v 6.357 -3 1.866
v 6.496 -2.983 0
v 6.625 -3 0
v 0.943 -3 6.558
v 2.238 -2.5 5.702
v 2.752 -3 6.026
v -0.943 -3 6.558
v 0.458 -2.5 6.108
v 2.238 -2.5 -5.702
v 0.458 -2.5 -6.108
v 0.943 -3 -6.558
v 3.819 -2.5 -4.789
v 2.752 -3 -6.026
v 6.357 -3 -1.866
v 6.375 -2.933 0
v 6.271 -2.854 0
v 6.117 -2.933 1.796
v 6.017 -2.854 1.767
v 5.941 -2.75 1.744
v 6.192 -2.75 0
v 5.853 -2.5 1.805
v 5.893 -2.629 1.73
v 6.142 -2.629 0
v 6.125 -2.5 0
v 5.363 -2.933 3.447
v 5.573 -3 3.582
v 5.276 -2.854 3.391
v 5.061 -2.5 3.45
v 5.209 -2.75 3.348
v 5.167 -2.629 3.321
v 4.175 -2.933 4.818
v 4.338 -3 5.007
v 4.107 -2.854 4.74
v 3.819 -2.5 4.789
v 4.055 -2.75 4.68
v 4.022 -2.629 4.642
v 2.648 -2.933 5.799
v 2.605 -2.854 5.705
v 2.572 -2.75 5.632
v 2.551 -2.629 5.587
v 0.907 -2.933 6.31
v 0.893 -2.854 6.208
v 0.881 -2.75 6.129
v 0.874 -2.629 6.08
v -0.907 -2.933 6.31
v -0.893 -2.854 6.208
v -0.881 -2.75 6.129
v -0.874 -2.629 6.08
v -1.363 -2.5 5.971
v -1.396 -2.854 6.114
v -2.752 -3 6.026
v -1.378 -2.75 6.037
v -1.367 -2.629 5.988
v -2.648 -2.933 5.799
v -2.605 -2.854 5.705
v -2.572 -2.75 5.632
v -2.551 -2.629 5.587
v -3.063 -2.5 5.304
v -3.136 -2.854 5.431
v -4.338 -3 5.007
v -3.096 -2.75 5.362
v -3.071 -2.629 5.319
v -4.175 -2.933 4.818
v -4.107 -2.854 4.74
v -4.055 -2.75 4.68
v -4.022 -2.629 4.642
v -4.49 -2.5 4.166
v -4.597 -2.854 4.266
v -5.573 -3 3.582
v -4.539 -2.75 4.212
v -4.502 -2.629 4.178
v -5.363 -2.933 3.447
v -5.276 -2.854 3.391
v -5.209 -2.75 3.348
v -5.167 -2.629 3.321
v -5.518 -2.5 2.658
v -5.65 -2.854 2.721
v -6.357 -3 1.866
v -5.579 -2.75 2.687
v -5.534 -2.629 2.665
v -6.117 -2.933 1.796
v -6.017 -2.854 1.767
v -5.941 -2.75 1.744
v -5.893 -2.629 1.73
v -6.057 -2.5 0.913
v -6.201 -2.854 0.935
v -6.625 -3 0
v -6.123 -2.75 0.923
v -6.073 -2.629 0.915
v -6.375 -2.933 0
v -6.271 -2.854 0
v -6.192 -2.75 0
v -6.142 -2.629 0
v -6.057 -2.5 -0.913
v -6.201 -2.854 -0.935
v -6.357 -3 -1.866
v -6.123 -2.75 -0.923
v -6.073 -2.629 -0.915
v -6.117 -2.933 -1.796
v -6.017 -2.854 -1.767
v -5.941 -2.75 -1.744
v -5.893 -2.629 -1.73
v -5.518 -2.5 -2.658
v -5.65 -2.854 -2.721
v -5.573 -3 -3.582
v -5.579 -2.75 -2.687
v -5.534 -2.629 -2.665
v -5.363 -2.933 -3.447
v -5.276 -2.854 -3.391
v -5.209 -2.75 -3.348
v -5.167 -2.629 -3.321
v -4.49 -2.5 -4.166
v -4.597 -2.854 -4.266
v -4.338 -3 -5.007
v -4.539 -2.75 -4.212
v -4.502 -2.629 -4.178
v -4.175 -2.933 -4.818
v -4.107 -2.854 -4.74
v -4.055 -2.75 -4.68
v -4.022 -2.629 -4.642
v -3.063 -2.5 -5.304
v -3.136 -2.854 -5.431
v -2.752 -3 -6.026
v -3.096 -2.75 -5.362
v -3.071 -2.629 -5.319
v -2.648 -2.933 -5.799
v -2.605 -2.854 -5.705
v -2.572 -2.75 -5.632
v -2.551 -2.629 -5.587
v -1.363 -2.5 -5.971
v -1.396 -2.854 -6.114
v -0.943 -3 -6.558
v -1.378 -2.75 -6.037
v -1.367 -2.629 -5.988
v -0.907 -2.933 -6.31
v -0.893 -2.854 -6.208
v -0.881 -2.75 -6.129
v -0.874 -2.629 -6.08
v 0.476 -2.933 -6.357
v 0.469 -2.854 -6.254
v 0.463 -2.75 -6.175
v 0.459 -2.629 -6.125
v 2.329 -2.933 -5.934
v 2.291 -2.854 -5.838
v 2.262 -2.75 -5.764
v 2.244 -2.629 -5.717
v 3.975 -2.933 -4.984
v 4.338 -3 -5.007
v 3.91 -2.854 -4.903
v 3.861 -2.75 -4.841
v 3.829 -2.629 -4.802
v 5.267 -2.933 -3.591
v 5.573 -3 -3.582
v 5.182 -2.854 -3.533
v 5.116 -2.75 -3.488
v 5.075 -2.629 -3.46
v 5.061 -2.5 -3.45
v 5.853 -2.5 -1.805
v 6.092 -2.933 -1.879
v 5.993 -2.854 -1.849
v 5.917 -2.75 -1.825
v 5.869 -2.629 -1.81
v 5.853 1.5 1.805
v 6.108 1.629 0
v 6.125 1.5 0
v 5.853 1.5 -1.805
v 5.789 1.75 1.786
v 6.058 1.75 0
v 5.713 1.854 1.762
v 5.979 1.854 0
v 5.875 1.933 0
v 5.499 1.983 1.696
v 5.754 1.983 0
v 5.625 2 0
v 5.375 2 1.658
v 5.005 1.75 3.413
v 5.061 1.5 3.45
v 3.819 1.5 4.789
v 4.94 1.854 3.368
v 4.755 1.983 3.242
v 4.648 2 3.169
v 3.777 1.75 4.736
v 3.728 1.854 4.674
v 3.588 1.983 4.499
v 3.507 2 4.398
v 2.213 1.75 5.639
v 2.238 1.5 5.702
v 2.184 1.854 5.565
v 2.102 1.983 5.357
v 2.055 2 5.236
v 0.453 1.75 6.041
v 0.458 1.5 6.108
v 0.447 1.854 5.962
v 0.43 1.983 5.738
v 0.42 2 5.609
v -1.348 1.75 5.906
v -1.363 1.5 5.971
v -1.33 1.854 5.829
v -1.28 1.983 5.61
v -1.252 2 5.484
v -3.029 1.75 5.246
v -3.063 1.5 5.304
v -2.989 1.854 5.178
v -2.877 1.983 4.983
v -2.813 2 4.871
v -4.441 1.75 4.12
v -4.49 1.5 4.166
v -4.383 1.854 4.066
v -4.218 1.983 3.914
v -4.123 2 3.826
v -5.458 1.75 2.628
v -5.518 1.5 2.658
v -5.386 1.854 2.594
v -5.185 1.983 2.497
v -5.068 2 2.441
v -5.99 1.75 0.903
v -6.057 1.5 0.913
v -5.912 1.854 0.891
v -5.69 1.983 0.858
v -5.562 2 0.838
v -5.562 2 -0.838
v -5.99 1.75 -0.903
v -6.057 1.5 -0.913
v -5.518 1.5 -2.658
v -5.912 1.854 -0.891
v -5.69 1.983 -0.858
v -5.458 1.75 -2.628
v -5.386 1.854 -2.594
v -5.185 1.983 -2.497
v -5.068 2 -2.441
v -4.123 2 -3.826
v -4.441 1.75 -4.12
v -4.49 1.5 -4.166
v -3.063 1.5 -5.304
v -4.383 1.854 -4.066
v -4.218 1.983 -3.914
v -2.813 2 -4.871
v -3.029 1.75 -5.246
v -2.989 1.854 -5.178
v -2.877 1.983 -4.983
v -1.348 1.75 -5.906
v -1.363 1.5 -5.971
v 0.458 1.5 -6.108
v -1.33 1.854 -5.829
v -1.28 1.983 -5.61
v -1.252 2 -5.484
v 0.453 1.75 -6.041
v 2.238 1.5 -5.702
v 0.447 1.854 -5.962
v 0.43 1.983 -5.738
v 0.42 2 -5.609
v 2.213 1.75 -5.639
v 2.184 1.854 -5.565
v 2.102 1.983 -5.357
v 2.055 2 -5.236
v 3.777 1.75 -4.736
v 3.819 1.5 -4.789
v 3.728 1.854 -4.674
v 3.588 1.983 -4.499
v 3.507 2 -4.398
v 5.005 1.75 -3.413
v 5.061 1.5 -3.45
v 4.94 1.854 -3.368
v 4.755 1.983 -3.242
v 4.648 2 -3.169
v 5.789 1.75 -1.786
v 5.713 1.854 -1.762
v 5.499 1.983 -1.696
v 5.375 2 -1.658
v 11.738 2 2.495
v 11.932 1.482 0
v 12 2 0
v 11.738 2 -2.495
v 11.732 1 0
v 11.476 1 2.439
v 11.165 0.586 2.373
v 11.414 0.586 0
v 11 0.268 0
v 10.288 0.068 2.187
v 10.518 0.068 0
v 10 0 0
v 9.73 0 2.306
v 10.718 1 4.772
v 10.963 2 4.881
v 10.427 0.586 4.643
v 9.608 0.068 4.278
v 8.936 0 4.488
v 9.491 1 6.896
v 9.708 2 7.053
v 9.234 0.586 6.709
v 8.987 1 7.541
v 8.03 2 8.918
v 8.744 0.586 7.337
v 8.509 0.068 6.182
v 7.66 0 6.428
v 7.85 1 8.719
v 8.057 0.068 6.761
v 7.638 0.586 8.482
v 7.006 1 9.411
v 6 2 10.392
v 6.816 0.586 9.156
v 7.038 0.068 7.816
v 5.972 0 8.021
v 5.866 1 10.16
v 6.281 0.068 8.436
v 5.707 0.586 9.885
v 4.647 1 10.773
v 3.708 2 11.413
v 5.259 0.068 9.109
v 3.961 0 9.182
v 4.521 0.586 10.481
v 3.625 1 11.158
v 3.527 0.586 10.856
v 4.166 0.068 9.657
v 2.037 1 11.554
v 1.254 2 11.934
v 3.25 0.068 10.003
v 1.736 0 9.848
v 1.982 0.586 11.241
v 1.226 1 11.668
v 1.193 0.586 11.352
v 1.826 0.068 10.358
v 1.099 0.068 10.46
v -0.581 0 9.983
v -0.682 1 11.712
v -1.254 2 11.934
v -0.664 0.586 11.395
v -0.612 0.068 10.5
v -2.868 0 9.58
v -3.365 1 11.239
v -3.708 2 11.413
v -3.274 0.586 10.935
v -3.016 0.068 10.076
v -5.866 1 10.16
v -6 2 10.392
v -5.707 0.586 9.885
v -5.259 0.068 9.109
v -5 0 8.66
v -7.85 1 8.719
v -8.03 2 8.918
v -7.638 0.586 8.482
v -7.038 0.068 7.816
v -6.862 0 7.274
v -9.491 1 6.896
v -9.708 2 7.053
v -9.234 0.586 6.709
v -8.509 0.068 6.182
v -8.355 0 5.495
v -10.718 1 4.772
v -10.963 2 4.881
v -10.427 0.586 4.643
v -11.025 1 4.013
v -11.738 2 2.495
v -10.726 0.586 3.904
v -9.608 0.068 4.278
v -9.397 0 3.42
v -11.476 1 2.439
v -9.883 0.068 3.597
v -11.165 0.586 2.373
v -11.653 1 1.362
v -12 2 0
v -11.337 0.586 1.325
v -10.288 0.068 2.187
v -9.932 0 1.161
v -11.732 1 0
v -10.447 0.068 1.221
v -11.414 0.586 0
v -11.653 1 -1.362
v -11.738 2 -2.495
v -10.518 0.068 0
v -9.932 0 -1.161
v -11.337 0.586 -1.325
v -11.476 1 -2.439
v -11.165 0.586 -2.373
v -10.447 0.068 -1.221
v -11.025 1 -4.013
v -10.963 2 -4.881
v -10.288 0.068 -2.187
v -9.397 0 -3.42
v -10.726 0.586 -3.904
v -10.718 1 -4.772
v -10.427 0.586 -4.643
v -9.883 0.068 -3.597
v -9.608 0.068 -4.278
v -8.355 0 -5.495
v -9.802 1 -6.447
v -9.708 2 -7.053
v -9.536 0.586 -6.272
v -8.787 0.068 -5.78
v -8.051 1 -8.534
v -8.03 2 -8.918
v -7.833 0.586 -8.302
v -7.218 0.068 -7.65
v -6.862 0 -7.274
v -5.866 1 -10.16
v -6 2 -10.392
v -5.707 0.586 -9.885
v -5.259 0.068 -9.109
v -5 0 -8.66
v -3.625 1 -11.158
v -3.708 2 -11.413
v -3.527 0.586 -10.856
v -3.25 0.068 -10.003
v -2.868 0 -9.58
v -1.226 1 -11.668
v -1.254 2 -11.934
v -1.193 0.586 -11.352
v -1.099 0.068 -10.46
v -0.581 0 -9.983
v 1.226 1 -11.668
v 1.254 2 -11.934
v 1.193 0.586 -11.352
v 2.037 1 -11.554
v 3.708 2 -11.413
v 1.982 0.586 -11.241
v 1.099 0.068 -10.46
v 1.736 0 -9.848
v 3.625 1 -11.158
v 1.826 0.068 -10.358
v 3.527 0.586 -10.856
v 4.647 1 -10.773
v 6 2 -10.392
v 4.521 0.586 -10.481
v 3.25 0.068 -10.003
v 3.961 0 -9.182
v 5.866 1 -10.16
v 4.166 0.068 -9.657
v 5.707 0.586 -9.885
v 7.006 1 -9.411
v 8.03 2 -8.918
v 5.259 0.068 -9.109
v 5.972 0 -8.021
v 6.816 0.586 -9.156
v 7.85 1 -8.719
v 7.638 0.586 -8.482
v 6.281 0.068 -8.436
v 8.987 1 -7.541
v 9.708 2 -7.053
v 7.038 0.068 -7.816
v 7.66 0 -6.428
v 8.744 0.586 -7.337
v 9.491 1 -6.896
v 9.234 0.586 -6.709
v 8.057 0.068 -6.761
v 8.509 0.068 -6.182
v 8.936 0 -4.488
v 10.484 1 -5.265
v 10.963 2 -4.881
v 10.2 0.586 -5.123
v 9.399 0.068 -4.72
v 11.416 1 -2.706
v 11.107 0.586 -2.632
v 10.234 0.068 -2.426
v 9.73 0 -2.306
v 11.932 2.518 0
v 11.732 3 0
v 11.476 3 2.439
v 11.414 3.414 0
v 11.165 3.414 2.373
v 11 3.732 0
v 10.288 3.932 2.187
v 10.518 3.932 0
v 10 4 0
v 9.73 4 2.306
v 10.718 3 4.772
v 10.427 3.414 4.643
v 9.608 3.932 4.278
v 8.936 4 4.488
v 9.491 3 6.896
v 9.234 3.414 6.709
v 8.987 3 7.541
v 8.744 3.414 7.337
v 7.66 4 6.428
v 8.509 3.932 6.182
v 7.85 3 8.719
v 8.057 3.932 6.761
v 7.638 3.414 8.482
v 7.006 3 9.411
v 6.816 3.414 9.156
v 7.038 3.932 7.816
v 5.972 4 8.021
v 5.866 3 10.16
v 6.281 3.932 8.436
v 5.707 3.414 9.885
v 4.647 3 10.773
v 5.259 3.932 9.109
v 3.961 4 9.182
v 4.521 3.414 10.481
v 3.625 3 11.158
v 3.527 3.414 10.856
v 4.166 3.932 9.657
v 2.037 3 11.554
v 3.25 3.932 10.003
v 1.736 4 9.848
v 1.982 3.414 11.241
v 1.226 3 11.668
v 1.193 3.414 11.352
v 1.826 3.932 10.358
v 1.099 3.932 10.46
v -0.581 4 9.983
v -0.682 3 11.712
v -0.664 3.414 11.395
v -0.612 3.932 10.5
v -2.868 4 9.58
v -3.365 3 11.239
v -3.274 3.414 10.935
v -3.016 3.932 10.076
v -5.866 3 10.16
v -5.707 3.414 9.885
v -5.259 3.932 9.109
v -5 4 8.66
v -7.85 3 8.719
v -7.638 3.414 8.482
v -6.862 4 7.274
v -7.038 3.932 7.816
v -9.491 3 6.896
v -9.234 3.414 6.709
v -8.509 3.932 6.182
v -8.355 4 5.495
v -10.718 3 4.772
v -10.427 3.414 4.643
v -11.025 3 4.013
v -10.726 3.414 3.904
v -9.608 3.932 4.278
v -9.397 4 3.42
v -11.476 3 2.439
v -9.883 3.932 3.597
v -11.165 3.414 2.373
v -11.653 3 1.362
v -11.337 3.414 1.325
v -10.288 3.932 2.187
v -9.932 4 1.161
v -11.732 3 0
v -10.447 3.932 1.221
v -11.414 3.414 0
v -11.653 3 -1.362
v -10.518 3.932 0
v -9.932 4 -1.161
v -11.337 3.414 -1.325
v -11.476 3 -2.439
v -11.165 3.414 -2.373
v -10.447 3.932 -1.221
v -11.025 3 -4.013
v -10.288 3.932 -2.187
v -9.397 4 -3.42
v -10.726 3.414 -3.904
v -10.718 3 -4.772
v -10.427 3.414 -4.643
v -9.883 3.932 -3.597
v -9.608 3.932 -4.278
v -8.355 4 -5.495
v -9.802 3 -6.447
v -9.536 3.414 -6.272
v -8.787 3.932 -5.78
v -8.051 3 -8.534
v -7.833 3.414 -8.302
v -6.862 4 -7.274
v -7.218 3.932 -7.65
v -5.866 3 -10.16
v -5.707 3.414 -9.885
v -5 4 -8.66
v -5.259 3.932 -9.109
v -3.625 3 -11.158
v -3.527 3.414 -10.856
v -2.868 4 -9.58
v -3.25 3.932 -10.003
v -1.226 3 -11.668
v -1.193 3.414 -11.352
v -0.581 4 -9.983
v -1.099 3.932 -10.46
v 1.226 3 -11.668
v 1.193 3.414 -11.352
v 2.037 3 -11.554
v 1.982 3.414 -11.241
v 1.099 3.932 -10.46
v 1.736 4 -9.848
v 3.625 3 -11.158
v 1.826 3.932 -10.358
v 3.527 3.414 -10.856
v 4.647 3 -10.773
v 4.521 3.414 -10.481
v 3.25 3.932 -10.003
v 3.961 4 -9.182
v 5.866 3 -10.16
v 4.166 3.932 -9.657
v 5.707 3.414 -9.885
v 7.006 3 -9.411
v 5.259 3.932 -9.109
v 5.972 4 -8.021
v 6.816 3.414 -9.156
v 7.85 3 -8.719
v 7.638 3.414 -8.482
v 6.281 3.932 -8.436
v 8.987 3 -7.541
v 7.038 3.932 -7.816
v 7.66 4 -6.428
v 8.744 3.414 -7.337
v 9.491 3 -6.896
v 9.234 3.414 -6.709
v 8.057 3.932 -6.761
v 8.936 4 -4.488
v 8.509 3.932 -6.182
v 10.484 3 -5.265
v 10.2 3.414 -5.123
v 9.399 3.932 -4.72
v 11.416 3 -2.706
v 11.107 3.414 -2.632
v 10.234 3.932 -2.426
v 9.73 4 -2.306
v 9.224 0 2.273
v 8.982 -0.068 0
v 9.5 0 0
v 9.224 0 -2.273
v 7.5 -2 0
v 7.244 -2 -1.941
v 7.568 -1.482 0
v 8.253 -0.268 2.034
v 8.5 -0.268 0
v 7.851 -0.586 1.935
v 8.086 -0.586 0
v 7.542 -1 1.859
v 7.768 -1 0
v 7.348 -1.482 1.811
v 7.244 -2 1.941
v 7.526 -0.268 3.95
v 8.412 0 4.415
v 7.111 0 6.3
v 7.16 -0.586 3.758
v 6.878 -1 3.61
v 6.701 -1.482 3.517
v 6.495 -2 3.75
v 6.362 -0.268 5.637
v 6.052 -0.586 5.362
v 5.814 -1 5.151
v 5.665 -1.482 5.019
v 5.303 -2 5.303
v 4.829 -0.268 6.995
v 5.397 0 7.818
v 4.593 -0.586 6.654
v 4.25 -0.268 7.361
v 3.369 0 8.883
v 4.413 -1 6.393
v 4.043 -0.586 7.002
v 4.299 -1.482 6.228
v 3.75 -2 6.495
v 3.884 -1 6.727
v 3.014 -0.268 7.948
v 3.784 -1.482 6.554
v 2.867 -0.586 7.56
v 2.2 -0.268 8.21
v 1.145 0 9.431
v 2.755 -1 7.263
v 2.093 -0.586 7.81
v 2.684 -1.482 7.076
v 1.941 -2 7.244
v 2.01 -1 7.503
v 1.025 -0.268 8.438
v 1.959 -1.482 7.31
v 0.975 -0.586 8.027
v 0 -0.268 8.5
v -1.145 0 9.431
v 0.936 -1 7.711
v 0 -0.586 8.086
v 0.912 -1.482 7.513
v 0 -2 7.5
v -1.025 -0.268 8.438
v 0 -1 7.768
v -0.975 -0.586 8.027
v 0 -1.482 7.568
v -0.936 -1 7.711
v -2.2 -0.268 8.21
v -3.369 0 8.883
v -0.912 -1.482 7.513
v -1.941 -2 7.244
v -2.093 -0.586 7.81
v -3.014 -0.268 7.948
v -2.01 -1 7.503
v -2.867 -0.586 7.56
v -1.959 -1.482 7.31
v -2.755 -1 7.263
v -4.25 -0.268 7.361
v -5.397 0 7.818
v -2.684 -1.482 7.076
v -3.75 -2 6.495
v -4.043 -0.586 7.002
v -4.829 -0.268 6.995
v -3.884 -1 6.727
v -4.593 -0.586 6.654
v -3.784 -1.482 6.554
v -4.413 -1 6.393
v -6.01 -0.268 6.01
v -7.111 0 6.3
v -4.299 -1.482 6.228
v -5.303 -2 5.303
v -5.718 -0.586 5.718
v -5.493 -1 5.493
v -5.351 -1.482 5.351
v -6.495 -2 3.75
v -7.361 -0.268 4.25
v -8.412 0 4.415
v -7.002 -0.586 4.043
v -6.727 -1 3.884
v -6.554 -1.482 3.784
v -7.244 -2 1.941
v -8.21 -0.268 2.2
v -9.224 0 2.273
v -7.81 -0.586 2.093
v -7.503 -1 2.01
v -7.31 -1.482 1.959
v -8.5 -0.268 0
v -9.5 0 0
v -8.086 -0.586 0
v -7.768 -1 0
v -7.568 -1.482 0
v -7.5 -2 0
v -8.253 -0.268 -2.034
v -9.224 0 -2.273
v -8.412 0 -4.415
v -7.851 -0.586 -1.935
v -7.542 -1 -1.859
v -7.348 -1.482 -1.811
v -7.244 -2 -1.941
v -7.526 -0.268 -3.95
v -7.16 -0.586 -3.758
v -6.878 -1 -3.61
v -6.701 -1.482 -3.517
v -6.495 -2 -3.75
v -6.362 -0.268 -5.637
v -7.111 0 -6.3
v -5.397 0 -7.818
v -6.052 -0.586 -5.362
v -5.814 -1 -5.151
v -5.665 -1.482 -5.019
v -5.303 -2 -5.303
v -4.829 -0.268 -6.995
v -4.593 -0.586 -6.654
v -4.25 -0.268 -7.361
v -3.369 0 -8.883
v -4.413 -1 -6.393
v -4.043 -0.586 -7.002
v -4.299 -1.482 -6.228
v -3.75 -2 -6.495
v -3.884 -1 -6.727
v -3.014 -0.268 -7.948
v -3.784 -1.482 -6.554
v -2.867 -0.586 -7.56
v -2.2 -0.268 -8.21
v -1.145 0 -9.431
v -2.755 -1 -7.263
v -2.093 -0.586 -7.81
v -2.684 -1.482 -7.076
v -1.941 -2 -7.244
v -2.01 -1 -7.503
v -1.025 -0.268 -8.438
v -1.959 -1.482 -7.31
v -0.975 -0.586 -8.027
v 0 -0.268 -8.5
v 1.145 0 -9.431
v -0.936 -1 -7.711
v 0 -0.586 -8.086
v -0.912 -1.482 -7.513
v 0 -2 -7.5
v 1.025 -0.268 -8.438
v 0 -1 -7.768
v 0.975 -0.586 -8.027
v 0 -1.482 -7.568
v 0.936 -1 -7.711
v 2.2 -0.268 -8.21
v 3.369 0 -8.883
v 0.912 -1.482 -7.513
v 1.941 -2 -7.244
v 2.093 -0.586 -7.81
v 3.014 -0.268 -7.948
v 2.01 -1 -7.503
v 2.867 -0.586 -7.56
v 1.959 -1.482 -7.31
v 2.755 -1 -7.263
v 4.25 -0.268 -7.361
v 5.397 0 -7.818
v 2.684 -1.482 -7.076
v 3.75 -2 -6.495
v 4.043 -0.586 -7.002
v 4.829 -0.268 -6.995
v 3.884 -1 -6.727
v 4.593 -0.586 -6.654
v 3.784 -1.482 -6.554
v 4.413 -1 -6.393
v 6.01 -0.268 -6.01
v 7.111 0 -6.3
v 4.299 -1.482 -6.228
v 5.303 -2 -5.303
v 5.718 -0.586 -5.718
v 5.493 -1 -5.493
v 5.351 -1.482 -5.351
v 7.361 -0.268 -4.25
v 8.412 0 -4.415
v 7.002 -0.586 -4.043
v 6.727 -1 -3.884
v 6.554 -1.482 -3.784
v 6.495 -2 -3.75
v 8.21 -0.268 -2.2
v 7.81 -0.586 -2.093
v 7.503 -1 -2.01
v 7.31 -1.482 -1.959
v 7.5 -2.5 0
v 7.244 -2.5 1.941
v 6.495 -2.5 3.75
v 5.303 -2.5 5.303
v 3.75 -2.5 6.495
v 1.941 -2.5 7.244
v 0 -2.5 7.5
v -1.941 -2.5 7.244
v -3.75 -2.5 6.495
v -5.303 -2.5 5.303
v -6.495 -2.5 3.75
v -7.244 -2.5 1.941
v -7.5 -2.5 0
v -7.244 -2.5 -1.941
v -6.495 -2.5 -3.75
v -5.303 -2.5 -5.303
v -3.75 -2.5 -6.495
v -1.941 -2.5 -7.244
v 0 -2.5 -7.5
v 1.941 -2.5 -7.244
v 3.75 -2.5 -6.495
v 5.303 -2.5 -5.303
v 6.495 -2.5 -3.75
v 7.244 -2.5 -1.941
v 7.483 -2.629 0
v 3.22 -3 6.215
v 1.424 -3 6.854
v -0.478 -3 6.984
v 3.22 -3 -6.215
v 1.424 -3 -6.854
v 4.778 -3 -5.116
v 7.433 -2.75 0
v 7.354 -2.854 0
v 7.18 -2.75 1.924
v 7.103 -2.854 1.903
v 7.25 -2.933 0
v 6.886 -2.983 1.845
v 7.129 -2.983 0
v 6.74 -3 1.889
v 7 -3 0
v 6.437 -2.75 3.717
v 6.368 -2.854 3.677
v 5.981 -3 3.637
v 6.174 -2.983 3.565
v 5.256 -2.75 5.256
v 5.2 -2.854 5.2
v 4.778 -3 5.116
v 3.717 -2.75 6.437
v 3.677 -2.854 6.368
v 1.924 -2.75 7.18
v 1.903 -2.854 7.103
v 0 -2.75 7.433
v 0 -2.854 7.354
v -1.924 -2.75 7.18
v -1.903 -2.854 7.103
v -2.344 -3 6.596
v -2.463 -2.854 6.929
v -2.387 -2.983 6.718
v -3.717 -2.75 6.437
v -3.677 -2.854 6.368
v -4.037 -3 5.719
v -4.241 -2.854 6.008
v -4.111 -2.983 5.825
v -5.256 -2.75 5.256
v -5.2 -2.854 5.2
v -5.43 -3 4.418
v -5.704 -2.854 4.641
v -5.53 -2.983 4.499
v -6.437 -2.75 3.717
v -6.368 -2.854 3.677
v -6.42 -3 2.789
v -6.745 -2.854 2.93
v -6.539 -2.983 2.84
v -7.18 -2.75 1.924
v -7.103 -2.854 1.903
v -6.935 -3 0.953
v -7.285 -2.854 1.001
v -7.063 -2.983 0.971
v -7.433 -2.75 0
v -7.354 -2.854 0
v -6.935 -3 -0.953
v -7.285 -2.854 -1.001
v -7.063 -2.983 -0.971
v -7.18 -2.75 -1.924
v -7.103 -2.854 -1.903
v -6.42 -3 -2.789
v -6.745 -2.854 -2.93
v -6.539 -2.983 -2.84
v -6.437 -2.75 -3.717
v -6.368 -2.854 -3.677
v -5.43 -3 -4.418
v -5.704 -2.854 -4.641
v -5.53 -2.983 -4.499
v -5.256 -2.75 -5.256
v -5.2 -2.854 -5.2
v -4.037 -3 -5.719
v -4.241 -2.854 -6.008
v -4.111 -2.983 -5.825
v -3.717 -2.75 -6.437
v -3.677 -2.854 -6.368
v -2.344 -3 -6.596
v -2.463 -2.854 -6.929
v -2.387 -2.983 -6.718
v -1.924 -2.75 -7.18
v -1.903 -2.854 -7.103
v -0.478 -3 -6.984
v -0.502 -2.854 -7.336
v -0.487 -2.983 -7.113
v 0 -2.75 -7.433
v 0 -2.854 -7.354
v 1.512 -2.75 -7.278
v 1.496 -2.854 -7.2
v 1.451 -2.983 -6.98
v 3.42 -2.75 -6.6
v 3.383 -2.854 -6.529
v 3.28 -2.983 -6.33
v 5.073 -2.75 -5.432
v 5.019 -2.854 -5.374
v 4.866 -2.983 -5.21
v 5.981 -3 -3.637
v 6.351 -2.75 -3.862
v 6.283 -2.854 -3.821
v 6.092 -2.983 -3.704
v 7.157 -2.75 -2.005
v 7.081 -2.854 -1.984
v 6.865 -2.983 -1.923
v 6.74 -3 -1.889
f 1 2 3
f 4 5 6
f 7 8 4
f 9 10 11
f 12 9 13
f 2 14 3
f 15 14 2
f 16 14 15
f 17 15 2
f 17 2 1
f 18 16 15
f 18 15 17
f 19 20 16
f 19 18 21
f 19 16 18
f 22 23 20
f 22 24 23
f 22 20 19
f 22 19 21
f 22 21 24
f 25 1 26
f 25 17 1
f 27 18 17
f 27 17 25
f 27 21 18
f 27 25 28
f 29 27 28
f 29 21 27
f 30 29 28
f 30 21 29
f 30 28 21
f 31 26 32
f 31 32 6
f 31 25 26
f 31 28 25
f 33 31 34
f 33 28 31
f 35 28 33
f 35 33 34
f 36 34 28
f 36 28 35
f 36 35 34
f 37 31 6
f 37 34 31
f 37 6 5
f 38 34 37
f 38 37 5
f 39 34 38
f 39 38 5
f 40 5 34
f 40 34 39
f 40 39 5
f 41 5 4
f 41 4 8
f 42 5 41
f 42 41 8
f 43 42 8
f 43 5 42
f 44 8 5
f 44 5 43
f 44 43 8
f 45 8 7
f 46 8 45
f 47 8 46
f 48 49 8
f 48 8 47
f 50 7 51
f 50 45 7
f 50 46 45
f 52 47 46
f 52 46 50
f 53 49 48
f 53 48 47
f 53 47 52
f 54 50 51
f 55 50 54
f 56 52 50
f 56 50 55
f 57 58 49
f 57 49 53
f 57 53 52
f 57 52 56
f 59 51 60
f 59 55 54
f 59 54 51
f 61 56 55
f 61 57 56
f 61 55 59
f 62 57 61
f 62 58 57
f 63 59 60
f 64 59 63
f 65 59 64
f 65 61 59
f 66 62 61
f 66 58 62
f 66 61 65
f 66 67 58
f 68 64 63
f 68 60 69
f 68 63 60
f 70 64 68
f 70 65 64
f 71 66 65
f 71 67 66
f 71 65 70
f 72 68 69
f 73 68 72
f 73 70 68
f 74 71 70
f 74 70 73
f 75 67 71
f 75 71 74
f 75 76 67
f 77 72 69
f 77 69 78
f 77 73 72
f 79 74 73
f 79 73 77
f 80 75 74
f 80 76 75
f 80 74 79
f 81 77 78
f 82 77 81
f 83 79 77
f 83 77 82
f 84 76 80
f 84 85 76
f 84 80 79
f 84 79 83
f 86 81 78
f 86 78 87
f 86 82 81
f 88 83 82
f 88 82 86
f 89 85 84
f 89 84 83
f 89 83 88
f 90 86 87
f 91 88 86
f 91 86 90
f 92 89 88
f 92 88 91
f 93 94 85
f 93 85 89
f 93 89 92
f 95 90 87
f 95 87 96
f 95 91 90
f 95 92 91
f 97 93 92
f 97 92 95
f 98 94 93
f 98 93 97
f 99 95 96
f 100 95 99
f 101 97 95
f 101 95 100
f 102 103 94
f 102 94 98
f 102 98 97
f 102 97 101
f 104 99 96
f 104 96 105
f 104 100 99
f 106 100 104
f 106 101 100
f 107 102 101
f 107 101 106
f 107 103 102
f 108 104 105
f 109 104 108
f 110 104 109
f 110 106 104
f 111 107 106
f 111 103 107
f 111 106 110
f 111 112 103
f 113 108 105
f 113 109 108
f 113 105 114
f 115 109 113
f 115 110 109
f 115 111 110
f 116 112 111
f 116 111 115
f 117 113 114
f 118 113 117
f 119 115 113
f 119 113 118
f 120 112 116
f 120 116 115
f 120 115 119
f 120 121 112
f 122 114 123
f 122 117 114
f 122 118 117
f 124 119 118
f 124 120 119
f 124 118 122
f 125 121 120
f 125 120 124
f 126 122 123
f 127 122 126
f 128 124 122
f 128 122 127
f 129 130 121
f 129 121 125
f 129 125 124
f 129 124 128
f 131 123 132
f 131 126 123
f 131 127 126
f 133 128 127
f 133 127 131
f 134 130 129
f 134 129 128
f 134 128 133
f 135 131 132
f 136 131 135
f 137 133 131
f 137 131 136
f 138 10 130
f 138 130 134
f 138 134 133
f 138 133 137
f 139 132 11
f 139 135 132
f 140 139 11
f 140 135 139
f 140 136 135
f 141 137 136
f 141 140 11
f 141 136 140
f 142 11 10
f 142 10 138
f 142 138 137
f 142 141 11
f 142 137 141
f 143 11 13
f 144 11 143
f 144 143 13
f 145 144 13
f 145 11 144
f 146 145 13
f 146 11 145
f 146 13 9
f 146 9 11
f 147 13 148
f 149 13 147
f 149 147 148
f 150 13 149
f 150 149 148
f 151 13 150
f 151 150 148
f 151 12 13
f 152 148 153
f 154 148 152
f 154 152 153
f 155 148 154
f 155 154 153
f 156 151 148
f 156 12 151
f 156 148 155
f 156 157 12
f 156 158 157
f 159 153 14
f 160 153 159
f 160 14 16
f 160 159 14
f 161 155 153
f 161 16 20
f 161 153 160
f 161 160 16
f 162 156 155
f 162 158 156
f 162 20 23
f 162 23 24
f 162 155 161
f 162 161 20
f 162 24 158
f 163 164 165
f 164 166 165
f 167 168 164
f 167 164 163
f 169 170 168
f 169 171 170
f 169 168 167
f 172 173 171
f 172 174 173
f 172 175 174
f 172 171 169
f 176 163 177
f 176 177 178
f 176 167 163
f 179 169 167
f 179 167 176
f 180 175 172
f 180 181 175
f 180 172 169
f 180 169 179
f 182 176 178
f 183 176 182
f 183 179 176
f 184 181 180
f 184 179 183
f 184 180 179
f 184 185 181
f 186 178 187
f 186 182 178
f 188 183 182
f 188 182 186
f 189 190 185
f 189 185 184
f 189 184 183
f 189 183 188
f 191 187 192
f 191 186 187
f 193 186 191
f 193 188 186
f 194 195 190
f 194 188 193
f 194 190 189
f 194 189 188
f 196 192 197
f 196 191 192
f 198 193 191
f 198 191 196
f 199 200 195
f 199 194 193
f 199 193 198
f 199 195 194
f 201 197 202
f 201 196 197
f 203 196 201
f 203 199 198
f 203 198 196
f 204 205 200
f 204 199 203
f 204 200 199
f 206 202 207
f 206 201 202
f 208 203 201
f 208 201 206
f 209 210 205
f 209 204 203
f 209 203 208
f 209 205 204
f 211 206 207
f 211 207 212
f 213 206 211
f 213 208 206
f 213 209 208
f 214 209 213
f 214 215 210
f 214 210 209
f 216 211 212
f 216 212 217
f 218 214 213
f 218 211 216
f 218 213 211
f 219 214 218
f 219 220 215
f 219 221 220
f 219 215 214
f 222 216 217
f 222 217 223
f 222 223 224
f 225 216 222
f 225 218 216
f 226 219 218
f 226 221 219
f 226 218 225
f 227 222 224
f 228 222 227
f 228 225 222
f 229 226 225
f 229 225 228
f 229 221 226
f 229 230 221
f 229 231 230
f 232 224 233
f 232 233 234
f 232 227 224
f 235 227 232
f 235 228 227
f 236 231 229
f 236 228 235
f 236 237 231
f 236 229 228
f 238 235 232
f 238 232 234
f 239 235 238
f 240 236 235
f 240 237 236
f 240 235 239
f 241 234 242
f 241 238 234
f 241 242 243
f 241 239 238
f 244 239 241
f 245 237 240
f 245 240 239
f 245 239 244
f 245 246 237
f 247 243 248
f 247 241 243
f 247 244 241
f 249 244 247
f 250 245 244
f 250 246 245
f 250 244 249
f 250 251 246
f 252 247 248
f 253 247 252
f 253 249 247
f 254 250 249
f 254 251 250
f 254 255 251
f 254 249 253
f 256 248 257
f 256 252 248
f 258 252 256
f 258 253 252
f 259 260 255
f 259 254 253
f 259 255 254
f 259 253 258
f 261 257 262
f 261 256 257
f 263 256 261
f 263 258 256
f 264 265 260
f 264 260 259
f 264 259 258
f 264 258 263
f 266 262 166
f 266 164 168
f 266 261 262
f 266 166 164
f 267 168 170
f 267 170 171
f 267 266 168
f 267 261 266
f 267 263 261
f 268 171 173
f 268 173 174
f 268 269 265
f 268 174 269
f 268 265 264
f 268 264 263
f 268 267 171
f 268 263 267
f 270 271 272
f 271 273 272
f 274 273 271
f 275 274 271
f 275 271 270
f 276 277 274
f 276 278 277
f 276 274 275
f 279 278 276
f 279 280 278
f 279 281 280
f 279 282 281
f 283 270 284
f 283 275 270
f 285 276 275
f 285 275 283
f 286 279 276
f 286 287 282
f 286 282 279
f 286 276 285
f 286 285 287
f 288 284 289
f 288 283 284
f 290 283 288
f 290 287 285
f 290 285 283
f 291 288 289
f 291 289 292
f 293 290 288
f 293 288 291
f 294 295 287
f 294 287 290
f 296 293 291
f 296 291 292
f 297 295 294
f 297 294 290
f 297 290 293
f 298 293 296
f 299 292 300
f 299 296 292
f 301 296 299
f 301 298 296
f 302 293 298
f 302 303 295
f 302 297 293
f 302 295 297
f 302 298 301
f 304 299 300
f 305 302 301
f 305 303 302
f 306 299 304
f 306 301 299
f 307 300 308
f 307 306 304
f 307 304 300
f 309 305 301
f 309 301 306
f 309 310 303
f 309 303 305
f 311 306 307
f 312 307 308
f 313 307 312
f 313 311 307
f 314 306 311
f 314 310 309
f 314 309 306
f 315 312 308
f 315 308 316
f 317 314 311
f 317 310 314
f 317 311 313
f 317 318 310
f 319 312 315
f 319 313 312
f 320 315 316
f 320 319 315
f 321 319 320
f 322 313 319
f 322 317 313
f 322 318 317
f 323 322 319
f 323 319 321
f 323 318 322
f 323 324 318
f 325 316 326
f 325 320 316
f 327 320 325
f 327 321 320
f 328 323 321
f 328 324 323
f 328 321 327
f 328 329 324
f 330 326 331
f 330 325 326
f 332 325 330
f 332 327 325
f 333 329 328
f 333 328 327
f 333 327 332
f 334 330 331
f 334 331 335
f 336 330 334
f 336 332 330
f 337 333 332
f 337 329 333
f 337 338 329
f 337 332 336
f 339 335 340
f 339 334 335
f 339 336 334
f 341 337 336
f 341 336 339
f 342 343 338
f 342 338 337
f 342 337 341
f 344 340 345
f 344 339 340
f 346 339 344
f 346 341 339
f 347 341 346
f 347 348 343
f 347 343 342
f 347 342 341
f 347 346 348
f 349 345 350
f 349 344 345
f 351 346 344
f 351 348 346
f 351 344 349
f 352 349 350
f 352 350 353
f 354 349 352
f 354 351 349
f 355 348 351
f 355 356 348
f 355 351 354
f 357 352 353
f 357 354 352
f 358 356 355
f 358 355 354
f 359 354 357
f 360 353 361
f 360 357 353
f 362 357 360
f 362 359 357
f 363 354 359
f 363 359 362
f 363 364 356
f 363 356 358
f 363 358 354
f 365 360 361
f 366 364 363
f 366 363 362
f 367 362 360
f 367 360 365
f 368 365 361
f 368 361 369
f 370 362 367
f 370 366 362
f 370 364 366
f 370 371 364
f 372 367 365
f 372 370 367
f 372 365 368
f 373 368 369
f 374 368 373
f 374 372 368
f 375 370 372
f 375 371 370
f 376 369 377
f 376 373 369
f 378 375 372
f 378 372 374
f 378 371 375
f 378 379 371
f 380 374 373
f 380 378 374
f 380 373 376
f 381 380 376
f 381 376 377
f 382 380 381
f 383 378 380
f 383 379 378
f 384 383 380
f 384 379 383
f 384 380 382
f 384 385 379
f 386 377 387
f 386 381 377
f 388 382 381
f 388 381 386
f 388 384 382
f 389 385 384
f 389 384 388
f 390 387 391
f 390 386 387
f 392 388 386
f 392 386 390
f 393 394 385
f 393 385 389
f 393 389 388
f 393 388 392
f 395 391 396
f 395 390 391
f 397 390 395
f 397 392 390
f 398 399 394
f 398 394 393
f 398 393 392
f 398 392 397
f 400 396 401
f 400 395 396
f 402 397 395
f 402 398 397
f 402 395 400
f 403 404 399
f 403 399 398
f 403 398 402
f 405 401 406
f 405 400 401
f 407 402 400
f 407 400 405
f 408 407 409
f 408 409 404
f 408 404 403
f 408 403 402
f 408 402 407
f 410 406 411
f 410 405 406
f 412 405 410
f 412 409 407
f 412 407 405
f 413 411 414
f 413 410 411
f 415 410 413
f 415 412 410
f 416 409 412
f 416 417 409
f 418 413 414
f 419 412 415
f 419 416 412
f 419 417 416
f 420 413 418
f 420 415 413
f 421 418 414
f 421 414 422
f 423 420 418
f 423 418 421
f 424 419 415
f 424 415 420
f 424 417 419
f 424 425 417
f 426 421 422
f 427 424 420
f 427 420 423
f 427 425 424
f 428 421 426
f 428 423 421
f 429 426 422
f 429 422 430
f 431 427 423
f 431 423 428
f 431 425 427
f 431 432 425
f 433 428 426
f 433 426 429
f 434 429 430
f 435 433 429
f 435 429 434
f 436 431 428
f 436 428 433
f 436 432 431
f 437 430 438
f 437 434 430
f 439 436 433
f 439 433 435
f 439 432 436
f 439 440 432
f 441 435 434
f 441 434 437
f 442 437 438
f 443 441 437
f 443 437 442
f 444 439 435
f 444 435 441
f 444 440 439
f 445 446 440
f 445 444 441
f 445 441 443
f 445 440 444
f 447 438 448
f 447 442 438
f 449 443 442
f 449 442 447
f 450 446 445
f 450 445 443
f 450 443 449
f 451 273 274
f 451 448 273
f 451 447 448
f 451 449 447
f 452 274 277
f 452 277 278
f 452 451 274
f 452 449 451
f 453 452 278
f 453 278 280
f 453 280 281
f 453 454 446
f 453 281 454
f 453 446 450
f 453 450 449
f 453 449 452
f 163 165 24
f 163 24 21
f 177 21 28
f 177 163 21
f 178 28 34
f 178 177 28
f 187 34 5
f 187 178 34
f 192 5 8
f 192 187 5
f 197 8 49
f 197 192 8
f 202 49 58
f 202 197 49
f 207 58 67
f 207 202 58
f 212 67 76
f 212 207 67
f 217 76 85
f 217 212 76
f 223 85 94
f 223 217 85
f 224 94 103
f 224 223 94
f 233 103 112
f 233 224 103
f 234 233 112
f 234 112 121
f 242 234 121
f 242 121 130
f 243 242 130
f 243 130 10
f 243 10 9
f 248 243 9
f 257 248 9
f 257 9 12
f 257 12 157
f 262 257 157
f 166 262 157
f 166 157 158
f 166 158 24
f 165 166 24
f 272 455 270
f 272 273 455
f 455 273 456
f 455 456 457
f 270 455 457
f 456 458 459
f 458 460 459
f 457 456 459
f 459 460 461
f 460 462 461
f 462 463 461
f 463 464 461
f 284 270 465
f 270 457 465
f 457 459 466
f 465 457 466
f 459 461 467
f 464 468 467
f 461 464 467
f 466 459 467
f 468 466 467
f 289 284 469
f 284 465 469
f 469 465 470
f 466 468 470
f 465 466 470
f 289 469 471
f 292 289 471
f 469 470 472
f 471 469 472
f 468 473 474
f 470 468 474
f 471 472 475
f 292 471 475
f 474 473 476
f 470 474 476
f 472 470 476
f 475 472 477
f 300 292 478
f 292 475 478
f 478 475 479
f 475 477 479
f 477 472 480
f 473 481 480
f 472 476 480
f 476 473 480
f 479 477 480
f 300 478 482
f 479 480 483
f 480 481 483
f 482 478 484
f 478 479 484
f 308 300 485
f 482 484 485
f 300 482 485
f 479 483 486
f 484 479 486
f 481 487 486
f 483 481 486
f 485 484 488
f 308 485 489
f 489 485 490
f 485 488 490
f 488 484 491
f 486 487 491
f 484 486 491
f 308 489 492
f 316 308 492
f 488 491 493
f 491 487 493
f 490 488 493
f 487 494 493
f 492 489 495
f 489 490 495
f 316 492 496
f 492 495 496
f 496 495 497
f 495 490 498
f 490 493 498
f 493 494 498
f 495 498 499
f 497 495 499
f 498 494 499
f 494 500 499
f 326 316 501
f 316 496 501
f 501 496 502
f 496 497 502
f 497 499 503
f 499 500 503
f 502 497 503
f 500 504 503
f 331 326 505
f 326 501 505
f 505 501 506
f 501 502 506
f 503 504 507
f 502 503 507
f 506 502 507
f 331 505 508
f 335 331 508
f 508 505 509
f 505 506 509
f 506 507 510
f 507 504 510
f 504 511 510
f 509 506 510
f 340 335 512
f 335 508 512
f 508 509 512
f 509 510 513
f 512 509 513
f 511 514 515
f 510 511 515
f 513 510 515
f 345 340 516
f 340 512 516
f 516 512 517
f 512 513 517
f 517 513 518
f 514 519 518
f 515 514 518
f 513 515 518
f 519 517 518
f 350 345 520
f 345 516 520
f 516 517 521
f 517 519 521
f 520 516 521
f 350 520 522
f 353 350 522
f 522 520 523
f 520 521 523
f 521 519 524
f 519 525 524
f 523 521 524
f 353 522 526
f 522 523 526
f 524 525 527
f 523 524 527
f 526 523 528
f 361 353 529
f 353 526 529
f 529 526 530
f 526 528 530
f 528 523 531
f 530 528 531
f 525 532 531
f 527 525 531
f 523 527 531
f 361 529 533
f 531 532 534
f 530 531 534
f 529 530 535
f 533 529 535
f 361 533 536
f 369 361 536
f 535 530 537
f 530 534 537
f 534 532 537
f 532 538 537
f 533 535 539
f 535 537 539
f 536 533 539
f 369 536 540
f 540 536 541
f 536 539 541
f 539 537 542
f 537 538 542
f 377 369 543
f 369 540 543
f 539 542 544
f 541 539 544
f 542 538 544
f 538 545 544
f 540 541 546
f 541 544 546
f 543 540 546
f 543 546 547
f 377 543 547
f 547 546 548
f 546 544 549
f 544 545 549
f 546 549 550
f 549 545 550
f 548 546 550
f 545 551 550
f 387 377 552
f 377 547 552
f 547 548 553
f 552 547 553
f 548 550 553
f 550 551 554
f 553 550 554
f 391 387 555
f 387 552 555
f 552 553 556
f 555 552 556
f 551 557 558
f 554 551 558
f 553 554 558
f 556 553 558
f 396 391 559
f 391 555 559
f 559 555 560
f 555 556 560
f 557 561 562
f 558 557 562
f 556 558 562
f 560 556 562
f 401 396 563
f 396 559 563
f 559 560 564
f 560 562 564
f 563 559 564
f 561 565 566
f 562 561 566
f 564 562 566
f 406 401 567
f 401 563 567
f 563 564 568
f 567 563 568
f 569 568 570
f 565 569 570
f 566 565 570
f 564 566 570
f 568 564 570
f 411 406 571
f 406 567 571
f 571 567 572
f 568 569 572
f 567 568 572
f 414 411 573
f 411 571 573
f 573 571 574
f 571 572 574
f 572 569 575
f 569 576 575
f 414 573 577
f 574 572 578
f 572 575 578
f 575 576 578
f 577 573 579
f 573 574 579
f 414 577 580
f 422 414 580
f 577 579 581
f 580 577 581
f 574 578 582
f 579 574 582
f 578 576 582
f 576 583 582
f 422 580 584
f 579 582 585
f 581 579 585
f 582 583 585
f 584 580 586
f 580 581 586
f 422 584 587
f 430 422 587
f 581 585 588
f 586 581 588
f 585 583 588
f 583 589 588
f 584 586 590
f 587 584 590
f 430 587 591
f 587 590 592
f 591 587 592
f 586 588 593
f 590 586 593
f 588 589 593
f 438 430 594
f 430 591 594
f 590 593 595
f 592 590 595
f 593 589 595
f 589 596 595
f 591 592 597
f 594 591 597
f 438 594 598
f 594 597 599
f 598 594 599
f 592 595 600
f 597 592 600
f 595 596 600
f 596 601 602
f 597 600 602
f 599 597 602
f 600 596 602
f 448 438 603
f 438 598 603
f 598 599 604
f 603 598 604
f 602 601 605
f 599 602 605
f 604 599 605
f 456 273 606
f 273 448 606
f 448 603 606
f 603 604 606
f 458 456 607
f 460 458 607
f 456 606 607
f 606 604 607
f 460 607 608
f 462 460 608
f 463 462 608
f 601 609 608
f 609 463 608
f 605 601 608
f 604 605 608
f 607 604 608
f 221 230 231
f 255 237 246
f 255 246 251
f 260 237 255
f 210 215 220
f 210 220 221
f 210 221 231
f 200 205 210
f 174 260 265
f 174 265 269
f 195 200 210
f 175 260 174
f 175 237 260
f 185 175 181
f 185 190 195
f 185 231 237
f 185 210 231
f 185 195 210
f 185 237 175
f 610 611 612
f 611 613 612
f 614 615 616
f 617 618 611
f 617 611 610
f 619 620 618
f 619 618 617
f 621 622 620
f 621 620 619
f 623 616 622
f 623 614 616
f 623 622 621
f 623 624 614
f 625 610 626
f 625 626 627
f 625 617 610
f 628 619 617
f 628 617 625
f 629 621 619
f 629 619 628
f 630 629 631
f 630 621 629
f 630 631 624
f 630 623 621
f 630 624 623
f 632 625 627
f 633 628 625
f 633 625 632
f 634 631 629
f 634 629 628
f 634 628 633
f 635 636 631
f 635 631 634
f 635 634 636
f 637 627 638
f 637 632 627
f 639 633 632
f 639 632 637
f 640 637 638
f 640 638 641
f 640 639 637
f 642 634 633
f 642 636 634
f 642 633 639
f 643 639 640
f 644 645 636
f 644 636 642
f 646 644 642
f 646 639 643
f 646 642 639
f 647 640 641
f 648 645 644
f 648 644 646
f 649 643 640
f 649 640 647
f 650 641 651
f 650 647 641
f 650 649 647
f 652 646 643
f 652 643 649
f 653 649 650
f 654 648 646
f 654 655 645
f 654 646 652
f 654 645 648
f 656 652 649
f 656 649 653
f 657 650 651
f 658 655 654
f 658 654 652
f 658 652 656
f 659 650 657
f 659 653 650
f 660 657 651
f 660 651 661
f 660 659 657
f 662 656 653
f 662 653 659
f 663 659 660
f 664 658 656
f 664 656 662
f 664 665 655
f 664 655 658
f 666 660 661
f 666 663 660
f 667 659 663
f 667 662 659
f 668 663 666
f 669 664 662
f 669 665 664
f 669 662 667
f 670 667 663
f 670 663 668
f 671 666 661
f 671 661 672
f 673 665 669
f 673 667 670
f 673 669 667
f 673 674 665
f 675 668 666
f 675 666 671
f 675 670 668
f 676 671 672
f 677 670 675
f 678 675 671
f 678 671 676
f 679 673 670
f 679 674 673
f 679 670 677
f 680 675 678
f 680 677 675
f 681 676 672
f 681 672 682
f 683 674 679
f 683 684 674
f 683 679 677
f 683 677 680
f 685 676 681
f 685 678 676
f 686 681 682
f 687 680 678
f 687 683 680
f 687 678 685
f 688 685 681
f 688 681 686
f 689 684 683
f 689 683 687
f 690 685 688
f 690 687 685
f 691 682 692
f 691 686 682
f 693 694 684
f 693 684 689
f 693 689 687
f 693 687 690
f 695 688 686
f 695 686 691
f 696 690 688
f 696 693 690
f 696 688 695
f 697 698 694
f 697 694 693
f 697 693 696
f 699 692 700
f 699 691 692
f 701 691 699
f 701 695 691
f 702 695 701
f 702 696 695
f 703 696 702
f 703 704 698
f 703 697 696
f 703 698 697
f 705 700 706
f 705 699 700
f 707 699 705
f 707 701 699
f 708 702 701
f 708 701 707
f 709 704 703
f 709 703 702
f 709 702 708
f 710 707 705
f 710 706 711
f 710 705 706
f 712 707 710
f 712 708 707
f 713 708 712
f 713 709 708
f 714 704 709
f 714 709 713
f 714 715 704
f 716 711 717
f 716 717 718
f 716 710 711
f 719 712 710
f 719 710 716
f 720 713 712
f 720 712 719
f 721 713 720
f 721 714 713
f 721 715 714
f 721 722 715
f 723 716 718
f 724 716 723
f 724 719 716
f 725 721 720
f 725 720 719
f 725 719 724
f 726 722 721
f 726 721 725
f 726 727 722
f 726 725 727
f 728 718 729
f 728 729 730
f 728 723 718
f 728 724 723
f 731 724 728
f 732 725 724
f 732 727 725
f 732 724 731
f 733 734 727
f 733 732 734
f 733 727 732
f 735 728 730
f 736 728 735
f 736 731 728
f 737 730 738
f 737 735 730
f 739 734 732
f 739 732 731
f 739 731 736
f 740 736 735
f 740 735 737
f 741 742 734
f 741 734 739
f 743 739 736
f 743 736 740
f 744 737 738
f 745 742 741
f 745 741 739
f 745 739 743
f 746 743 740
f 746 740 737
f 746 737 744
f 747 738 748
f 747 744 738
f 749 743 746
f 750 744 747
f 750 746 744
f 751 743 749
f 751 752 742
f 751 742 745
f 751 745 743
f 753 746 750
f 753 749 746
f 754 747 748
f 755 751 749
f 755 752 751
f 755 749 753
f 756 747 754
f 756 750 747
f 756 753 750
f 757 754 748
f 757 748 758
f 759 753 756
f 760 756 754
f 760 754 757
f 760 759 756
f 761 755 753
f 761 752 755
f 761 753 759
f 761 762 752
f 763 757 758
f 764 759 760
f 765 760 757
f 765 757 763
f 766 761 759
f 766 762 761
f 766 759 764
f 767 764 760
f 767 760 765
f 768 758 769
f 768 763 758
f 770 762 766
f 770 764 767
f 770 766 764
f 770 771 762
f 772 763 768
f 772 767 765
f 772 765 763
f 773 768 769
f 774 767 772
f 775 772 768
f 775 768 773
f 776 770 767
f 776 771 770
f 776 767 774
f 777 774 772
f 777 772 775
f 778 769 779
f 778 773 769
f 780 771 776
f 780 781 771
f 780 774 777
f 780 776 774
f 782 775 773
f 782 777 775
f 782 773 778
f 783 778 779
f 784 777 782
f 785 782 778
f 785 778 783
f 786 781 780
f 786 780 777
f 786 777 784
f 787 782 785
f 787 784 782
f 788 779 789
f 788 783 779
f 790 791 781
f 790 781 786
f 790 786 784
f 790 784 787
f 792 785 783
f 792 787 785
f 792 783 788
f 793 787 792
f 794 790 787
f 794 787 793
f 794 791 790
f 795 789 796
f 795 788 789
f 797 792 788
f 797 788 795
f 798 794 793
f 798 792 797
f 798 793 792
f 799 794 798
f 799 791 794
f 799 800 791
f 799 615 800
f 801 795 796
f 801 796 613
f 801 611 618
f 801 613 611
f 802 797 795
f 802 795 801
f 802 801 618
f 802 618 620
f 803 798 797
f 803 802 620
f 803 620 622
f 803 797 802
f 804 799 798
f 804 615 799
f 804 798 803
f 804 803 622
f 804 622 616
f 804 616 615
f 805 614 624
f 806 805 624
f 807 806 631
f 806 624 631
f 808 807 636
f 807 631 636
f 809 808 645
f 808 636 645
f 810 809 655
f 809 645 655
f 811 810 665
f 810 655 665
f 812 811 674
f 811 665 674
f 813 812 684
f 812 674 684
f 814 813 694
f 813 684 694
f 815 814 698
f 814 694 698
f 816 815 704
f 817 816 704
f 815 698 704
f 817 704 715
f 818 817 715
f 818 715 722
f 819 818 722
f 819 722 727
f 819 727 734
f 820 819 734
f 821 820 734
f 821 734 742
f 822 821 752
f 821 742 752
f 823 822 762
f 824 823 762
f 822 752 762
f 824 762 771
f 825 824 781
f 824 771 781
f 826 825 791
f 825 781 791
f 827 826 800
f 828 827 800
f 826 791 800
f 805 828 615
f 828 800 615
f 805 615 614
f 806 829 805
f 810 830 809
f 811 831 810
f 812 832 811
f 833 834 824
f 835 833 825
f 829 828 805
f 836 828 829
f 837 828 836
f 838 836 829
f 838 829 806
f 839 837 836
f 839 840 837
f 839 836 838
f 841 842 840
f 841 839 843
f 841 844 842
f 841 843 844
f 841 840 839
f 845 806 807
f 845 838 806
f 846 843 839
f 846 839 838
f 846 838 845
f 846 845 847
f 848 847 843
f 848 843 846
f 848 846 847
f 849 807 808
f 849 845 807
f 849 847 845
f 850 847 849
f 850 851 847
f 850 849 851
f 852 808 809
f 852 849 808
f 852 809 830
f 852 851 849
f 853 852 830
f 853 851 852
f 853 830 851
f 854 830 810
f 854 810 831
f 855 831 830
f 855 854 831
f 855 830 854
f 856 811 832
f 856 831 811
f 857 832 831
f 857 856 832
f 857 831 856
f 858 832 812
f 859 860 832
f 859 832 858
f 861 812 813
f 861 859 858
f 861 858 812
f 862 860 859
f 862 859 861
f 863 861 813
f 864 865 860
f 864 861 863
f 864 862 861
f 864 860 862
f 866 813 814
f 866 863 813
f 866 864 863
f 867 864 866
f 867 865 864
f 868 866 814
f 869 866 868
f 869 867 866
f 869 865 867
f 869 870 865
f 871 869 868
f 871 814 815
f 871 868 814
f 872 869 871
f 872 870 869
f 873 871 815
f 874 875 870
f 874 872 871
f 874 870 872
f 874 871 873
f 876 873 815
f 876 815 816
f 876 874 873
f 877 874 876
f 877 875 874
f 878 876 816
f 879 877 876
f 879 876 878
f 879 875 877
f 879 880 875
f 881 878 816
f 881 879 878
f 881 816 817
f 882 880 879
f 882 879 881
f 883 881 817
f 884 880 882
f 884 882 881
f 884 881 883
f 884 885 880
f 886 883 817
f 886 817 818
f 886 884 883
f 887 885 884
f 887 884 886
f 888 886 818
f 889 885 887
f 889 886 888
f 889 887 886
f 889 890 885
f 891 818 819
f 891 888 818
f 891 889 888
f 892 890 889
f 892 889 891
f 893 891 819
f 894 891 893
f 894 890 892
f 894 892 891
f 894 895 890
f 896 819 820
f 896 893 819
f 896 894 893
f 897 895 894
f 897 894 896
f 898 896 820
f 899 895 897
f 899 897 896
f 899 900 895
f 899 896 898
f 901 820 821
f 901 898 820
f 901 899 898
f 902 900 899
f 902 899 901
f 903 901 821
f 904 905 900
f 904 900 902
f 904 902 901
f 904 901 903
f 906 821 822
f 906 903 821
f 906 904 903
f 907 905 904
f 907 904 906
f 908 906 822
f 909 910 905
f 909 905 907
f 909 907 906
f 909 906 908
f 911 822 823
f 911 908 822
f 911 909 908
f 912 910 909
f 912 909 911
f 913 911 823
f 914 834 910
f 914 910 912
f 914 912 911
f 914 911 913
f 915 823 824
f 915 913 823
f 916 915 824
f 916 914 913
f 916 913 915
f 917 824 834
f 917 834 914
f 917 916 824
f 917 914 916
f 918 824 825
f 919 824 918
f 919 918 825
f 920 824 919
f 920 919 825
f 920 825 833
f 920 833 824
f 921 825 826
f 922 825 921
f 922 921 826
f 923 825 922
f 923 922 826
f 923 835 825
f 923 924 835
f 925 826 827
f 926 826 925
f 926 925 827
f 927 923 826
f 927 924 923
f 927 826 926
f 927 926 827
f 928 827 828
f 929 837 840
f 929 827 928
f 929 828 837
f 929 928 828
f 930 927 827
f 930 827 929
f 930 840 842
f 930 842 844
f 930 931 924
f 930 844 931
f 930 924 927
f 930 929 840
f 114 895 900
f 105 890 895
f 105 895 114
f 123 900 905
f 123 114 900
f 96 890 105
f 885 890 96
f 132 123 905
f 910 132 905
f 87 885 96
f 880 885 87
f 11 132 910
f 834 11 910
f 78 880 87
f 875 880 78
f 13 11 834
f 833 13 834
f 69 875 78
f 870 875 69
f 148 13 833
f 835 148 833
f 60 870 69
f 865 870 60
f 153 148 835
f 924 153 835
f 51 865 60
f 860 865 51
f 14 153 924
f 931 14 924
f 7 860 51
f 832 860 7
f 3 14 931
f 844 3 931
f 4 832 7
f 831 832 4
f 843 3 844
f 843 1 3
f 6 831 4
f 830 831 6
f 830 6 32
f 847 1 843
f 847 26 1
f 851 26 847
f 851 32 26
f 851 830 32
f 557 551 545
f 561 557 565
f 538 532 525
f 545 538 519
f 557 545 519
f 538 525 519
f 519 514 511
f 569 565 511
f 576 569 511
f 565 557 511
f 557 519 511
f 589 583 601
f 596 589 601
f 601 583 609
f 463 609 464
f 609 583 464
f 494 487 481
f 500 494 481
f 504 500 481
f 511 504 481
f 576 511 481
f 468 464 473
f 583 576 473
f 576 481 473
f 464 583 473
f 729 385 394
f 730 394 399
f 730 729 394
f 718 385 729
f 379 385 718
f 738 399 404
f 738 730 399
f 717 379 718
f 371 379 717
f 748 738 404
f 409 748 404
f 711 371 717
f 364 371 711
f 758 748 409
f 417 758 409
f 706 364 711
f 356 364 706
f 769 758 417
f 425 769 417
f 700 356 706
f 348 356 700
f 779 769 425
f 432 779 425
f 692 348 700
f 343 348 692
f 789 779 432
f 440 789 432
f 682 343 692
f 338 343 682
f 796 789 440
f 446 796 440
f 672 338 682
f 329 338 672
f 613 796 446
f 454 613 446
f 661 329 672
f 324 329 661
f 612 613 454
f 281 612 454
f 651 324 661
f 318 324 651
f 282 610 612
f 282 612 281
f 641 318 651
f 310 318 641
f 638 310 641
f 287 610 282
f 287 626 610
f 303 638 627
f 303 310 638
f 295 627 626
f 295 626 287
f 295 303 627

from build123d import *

# Parameters (mm, degrees)
F0_R     = 12
F0_R_2   = 7.5
F0_R_3   = 6.125
F1_DEPTH = 4
F2_DEPTH = 3
F3_DEPTH = 2
F4_R     = 1.99999
F5_R     = 0.5


# Not quite as in the source:
# - a fillet or chamfer is up to 0.001 mm smaller than in the source, because OpenCascade refuses the exact size


with BuildPart() as f1:
    # F0 (on Front) → F1 (new body)
    with BuildSketch(Plane.XZ):
        Circle(F0_R)
        Circle(F0_R_2, mode=Mode.SUBTRACT)
        Circle(F0_R_2)
        Circle(F0_R_3, mode=Mode.SUBTRACT)
        Circle(F0_R_3)
    extrude(amount=-F1_DEPTH)

    # F0 (on Front) → F2 (join)
    with BuildSketch(Plane.XZ):
        Circle(F0_R_2)
        Circle(F0_R_3, mode=Mode.SUBTRACT)
    extrude(amount=F2_DEPTH)

    # F0 (on Front) → F3 (cut)
    with BuildSketch(Plane.XZ):
        Circle(F0_R_3)
    extrude(amount=-F3_DEPTH, mode=Mode.SUBTRACT)

    # F4 (radius 2 in the source; OpenCascade refuses exactly that, so slightly less here)
    f4_edges = [f1.edges().sort_by_distance(p)[0] for p in [
        (-7.5, 0, 0),
        (-12, 0, 0),
        (-12, 4, 0),
    ]]
    fillet(f4_edges, radius=F4_R)

    # F5
    f5_edges = [f1.edges().sort_by_distance(p)[0] for p in [
        (-7.5, -3, 0),
        (-6.125, -3, 0),
        (-6.125, 2, 0),
    ]]
    fillet(f5_edges, radius=F5_R)


solid = f1.part
